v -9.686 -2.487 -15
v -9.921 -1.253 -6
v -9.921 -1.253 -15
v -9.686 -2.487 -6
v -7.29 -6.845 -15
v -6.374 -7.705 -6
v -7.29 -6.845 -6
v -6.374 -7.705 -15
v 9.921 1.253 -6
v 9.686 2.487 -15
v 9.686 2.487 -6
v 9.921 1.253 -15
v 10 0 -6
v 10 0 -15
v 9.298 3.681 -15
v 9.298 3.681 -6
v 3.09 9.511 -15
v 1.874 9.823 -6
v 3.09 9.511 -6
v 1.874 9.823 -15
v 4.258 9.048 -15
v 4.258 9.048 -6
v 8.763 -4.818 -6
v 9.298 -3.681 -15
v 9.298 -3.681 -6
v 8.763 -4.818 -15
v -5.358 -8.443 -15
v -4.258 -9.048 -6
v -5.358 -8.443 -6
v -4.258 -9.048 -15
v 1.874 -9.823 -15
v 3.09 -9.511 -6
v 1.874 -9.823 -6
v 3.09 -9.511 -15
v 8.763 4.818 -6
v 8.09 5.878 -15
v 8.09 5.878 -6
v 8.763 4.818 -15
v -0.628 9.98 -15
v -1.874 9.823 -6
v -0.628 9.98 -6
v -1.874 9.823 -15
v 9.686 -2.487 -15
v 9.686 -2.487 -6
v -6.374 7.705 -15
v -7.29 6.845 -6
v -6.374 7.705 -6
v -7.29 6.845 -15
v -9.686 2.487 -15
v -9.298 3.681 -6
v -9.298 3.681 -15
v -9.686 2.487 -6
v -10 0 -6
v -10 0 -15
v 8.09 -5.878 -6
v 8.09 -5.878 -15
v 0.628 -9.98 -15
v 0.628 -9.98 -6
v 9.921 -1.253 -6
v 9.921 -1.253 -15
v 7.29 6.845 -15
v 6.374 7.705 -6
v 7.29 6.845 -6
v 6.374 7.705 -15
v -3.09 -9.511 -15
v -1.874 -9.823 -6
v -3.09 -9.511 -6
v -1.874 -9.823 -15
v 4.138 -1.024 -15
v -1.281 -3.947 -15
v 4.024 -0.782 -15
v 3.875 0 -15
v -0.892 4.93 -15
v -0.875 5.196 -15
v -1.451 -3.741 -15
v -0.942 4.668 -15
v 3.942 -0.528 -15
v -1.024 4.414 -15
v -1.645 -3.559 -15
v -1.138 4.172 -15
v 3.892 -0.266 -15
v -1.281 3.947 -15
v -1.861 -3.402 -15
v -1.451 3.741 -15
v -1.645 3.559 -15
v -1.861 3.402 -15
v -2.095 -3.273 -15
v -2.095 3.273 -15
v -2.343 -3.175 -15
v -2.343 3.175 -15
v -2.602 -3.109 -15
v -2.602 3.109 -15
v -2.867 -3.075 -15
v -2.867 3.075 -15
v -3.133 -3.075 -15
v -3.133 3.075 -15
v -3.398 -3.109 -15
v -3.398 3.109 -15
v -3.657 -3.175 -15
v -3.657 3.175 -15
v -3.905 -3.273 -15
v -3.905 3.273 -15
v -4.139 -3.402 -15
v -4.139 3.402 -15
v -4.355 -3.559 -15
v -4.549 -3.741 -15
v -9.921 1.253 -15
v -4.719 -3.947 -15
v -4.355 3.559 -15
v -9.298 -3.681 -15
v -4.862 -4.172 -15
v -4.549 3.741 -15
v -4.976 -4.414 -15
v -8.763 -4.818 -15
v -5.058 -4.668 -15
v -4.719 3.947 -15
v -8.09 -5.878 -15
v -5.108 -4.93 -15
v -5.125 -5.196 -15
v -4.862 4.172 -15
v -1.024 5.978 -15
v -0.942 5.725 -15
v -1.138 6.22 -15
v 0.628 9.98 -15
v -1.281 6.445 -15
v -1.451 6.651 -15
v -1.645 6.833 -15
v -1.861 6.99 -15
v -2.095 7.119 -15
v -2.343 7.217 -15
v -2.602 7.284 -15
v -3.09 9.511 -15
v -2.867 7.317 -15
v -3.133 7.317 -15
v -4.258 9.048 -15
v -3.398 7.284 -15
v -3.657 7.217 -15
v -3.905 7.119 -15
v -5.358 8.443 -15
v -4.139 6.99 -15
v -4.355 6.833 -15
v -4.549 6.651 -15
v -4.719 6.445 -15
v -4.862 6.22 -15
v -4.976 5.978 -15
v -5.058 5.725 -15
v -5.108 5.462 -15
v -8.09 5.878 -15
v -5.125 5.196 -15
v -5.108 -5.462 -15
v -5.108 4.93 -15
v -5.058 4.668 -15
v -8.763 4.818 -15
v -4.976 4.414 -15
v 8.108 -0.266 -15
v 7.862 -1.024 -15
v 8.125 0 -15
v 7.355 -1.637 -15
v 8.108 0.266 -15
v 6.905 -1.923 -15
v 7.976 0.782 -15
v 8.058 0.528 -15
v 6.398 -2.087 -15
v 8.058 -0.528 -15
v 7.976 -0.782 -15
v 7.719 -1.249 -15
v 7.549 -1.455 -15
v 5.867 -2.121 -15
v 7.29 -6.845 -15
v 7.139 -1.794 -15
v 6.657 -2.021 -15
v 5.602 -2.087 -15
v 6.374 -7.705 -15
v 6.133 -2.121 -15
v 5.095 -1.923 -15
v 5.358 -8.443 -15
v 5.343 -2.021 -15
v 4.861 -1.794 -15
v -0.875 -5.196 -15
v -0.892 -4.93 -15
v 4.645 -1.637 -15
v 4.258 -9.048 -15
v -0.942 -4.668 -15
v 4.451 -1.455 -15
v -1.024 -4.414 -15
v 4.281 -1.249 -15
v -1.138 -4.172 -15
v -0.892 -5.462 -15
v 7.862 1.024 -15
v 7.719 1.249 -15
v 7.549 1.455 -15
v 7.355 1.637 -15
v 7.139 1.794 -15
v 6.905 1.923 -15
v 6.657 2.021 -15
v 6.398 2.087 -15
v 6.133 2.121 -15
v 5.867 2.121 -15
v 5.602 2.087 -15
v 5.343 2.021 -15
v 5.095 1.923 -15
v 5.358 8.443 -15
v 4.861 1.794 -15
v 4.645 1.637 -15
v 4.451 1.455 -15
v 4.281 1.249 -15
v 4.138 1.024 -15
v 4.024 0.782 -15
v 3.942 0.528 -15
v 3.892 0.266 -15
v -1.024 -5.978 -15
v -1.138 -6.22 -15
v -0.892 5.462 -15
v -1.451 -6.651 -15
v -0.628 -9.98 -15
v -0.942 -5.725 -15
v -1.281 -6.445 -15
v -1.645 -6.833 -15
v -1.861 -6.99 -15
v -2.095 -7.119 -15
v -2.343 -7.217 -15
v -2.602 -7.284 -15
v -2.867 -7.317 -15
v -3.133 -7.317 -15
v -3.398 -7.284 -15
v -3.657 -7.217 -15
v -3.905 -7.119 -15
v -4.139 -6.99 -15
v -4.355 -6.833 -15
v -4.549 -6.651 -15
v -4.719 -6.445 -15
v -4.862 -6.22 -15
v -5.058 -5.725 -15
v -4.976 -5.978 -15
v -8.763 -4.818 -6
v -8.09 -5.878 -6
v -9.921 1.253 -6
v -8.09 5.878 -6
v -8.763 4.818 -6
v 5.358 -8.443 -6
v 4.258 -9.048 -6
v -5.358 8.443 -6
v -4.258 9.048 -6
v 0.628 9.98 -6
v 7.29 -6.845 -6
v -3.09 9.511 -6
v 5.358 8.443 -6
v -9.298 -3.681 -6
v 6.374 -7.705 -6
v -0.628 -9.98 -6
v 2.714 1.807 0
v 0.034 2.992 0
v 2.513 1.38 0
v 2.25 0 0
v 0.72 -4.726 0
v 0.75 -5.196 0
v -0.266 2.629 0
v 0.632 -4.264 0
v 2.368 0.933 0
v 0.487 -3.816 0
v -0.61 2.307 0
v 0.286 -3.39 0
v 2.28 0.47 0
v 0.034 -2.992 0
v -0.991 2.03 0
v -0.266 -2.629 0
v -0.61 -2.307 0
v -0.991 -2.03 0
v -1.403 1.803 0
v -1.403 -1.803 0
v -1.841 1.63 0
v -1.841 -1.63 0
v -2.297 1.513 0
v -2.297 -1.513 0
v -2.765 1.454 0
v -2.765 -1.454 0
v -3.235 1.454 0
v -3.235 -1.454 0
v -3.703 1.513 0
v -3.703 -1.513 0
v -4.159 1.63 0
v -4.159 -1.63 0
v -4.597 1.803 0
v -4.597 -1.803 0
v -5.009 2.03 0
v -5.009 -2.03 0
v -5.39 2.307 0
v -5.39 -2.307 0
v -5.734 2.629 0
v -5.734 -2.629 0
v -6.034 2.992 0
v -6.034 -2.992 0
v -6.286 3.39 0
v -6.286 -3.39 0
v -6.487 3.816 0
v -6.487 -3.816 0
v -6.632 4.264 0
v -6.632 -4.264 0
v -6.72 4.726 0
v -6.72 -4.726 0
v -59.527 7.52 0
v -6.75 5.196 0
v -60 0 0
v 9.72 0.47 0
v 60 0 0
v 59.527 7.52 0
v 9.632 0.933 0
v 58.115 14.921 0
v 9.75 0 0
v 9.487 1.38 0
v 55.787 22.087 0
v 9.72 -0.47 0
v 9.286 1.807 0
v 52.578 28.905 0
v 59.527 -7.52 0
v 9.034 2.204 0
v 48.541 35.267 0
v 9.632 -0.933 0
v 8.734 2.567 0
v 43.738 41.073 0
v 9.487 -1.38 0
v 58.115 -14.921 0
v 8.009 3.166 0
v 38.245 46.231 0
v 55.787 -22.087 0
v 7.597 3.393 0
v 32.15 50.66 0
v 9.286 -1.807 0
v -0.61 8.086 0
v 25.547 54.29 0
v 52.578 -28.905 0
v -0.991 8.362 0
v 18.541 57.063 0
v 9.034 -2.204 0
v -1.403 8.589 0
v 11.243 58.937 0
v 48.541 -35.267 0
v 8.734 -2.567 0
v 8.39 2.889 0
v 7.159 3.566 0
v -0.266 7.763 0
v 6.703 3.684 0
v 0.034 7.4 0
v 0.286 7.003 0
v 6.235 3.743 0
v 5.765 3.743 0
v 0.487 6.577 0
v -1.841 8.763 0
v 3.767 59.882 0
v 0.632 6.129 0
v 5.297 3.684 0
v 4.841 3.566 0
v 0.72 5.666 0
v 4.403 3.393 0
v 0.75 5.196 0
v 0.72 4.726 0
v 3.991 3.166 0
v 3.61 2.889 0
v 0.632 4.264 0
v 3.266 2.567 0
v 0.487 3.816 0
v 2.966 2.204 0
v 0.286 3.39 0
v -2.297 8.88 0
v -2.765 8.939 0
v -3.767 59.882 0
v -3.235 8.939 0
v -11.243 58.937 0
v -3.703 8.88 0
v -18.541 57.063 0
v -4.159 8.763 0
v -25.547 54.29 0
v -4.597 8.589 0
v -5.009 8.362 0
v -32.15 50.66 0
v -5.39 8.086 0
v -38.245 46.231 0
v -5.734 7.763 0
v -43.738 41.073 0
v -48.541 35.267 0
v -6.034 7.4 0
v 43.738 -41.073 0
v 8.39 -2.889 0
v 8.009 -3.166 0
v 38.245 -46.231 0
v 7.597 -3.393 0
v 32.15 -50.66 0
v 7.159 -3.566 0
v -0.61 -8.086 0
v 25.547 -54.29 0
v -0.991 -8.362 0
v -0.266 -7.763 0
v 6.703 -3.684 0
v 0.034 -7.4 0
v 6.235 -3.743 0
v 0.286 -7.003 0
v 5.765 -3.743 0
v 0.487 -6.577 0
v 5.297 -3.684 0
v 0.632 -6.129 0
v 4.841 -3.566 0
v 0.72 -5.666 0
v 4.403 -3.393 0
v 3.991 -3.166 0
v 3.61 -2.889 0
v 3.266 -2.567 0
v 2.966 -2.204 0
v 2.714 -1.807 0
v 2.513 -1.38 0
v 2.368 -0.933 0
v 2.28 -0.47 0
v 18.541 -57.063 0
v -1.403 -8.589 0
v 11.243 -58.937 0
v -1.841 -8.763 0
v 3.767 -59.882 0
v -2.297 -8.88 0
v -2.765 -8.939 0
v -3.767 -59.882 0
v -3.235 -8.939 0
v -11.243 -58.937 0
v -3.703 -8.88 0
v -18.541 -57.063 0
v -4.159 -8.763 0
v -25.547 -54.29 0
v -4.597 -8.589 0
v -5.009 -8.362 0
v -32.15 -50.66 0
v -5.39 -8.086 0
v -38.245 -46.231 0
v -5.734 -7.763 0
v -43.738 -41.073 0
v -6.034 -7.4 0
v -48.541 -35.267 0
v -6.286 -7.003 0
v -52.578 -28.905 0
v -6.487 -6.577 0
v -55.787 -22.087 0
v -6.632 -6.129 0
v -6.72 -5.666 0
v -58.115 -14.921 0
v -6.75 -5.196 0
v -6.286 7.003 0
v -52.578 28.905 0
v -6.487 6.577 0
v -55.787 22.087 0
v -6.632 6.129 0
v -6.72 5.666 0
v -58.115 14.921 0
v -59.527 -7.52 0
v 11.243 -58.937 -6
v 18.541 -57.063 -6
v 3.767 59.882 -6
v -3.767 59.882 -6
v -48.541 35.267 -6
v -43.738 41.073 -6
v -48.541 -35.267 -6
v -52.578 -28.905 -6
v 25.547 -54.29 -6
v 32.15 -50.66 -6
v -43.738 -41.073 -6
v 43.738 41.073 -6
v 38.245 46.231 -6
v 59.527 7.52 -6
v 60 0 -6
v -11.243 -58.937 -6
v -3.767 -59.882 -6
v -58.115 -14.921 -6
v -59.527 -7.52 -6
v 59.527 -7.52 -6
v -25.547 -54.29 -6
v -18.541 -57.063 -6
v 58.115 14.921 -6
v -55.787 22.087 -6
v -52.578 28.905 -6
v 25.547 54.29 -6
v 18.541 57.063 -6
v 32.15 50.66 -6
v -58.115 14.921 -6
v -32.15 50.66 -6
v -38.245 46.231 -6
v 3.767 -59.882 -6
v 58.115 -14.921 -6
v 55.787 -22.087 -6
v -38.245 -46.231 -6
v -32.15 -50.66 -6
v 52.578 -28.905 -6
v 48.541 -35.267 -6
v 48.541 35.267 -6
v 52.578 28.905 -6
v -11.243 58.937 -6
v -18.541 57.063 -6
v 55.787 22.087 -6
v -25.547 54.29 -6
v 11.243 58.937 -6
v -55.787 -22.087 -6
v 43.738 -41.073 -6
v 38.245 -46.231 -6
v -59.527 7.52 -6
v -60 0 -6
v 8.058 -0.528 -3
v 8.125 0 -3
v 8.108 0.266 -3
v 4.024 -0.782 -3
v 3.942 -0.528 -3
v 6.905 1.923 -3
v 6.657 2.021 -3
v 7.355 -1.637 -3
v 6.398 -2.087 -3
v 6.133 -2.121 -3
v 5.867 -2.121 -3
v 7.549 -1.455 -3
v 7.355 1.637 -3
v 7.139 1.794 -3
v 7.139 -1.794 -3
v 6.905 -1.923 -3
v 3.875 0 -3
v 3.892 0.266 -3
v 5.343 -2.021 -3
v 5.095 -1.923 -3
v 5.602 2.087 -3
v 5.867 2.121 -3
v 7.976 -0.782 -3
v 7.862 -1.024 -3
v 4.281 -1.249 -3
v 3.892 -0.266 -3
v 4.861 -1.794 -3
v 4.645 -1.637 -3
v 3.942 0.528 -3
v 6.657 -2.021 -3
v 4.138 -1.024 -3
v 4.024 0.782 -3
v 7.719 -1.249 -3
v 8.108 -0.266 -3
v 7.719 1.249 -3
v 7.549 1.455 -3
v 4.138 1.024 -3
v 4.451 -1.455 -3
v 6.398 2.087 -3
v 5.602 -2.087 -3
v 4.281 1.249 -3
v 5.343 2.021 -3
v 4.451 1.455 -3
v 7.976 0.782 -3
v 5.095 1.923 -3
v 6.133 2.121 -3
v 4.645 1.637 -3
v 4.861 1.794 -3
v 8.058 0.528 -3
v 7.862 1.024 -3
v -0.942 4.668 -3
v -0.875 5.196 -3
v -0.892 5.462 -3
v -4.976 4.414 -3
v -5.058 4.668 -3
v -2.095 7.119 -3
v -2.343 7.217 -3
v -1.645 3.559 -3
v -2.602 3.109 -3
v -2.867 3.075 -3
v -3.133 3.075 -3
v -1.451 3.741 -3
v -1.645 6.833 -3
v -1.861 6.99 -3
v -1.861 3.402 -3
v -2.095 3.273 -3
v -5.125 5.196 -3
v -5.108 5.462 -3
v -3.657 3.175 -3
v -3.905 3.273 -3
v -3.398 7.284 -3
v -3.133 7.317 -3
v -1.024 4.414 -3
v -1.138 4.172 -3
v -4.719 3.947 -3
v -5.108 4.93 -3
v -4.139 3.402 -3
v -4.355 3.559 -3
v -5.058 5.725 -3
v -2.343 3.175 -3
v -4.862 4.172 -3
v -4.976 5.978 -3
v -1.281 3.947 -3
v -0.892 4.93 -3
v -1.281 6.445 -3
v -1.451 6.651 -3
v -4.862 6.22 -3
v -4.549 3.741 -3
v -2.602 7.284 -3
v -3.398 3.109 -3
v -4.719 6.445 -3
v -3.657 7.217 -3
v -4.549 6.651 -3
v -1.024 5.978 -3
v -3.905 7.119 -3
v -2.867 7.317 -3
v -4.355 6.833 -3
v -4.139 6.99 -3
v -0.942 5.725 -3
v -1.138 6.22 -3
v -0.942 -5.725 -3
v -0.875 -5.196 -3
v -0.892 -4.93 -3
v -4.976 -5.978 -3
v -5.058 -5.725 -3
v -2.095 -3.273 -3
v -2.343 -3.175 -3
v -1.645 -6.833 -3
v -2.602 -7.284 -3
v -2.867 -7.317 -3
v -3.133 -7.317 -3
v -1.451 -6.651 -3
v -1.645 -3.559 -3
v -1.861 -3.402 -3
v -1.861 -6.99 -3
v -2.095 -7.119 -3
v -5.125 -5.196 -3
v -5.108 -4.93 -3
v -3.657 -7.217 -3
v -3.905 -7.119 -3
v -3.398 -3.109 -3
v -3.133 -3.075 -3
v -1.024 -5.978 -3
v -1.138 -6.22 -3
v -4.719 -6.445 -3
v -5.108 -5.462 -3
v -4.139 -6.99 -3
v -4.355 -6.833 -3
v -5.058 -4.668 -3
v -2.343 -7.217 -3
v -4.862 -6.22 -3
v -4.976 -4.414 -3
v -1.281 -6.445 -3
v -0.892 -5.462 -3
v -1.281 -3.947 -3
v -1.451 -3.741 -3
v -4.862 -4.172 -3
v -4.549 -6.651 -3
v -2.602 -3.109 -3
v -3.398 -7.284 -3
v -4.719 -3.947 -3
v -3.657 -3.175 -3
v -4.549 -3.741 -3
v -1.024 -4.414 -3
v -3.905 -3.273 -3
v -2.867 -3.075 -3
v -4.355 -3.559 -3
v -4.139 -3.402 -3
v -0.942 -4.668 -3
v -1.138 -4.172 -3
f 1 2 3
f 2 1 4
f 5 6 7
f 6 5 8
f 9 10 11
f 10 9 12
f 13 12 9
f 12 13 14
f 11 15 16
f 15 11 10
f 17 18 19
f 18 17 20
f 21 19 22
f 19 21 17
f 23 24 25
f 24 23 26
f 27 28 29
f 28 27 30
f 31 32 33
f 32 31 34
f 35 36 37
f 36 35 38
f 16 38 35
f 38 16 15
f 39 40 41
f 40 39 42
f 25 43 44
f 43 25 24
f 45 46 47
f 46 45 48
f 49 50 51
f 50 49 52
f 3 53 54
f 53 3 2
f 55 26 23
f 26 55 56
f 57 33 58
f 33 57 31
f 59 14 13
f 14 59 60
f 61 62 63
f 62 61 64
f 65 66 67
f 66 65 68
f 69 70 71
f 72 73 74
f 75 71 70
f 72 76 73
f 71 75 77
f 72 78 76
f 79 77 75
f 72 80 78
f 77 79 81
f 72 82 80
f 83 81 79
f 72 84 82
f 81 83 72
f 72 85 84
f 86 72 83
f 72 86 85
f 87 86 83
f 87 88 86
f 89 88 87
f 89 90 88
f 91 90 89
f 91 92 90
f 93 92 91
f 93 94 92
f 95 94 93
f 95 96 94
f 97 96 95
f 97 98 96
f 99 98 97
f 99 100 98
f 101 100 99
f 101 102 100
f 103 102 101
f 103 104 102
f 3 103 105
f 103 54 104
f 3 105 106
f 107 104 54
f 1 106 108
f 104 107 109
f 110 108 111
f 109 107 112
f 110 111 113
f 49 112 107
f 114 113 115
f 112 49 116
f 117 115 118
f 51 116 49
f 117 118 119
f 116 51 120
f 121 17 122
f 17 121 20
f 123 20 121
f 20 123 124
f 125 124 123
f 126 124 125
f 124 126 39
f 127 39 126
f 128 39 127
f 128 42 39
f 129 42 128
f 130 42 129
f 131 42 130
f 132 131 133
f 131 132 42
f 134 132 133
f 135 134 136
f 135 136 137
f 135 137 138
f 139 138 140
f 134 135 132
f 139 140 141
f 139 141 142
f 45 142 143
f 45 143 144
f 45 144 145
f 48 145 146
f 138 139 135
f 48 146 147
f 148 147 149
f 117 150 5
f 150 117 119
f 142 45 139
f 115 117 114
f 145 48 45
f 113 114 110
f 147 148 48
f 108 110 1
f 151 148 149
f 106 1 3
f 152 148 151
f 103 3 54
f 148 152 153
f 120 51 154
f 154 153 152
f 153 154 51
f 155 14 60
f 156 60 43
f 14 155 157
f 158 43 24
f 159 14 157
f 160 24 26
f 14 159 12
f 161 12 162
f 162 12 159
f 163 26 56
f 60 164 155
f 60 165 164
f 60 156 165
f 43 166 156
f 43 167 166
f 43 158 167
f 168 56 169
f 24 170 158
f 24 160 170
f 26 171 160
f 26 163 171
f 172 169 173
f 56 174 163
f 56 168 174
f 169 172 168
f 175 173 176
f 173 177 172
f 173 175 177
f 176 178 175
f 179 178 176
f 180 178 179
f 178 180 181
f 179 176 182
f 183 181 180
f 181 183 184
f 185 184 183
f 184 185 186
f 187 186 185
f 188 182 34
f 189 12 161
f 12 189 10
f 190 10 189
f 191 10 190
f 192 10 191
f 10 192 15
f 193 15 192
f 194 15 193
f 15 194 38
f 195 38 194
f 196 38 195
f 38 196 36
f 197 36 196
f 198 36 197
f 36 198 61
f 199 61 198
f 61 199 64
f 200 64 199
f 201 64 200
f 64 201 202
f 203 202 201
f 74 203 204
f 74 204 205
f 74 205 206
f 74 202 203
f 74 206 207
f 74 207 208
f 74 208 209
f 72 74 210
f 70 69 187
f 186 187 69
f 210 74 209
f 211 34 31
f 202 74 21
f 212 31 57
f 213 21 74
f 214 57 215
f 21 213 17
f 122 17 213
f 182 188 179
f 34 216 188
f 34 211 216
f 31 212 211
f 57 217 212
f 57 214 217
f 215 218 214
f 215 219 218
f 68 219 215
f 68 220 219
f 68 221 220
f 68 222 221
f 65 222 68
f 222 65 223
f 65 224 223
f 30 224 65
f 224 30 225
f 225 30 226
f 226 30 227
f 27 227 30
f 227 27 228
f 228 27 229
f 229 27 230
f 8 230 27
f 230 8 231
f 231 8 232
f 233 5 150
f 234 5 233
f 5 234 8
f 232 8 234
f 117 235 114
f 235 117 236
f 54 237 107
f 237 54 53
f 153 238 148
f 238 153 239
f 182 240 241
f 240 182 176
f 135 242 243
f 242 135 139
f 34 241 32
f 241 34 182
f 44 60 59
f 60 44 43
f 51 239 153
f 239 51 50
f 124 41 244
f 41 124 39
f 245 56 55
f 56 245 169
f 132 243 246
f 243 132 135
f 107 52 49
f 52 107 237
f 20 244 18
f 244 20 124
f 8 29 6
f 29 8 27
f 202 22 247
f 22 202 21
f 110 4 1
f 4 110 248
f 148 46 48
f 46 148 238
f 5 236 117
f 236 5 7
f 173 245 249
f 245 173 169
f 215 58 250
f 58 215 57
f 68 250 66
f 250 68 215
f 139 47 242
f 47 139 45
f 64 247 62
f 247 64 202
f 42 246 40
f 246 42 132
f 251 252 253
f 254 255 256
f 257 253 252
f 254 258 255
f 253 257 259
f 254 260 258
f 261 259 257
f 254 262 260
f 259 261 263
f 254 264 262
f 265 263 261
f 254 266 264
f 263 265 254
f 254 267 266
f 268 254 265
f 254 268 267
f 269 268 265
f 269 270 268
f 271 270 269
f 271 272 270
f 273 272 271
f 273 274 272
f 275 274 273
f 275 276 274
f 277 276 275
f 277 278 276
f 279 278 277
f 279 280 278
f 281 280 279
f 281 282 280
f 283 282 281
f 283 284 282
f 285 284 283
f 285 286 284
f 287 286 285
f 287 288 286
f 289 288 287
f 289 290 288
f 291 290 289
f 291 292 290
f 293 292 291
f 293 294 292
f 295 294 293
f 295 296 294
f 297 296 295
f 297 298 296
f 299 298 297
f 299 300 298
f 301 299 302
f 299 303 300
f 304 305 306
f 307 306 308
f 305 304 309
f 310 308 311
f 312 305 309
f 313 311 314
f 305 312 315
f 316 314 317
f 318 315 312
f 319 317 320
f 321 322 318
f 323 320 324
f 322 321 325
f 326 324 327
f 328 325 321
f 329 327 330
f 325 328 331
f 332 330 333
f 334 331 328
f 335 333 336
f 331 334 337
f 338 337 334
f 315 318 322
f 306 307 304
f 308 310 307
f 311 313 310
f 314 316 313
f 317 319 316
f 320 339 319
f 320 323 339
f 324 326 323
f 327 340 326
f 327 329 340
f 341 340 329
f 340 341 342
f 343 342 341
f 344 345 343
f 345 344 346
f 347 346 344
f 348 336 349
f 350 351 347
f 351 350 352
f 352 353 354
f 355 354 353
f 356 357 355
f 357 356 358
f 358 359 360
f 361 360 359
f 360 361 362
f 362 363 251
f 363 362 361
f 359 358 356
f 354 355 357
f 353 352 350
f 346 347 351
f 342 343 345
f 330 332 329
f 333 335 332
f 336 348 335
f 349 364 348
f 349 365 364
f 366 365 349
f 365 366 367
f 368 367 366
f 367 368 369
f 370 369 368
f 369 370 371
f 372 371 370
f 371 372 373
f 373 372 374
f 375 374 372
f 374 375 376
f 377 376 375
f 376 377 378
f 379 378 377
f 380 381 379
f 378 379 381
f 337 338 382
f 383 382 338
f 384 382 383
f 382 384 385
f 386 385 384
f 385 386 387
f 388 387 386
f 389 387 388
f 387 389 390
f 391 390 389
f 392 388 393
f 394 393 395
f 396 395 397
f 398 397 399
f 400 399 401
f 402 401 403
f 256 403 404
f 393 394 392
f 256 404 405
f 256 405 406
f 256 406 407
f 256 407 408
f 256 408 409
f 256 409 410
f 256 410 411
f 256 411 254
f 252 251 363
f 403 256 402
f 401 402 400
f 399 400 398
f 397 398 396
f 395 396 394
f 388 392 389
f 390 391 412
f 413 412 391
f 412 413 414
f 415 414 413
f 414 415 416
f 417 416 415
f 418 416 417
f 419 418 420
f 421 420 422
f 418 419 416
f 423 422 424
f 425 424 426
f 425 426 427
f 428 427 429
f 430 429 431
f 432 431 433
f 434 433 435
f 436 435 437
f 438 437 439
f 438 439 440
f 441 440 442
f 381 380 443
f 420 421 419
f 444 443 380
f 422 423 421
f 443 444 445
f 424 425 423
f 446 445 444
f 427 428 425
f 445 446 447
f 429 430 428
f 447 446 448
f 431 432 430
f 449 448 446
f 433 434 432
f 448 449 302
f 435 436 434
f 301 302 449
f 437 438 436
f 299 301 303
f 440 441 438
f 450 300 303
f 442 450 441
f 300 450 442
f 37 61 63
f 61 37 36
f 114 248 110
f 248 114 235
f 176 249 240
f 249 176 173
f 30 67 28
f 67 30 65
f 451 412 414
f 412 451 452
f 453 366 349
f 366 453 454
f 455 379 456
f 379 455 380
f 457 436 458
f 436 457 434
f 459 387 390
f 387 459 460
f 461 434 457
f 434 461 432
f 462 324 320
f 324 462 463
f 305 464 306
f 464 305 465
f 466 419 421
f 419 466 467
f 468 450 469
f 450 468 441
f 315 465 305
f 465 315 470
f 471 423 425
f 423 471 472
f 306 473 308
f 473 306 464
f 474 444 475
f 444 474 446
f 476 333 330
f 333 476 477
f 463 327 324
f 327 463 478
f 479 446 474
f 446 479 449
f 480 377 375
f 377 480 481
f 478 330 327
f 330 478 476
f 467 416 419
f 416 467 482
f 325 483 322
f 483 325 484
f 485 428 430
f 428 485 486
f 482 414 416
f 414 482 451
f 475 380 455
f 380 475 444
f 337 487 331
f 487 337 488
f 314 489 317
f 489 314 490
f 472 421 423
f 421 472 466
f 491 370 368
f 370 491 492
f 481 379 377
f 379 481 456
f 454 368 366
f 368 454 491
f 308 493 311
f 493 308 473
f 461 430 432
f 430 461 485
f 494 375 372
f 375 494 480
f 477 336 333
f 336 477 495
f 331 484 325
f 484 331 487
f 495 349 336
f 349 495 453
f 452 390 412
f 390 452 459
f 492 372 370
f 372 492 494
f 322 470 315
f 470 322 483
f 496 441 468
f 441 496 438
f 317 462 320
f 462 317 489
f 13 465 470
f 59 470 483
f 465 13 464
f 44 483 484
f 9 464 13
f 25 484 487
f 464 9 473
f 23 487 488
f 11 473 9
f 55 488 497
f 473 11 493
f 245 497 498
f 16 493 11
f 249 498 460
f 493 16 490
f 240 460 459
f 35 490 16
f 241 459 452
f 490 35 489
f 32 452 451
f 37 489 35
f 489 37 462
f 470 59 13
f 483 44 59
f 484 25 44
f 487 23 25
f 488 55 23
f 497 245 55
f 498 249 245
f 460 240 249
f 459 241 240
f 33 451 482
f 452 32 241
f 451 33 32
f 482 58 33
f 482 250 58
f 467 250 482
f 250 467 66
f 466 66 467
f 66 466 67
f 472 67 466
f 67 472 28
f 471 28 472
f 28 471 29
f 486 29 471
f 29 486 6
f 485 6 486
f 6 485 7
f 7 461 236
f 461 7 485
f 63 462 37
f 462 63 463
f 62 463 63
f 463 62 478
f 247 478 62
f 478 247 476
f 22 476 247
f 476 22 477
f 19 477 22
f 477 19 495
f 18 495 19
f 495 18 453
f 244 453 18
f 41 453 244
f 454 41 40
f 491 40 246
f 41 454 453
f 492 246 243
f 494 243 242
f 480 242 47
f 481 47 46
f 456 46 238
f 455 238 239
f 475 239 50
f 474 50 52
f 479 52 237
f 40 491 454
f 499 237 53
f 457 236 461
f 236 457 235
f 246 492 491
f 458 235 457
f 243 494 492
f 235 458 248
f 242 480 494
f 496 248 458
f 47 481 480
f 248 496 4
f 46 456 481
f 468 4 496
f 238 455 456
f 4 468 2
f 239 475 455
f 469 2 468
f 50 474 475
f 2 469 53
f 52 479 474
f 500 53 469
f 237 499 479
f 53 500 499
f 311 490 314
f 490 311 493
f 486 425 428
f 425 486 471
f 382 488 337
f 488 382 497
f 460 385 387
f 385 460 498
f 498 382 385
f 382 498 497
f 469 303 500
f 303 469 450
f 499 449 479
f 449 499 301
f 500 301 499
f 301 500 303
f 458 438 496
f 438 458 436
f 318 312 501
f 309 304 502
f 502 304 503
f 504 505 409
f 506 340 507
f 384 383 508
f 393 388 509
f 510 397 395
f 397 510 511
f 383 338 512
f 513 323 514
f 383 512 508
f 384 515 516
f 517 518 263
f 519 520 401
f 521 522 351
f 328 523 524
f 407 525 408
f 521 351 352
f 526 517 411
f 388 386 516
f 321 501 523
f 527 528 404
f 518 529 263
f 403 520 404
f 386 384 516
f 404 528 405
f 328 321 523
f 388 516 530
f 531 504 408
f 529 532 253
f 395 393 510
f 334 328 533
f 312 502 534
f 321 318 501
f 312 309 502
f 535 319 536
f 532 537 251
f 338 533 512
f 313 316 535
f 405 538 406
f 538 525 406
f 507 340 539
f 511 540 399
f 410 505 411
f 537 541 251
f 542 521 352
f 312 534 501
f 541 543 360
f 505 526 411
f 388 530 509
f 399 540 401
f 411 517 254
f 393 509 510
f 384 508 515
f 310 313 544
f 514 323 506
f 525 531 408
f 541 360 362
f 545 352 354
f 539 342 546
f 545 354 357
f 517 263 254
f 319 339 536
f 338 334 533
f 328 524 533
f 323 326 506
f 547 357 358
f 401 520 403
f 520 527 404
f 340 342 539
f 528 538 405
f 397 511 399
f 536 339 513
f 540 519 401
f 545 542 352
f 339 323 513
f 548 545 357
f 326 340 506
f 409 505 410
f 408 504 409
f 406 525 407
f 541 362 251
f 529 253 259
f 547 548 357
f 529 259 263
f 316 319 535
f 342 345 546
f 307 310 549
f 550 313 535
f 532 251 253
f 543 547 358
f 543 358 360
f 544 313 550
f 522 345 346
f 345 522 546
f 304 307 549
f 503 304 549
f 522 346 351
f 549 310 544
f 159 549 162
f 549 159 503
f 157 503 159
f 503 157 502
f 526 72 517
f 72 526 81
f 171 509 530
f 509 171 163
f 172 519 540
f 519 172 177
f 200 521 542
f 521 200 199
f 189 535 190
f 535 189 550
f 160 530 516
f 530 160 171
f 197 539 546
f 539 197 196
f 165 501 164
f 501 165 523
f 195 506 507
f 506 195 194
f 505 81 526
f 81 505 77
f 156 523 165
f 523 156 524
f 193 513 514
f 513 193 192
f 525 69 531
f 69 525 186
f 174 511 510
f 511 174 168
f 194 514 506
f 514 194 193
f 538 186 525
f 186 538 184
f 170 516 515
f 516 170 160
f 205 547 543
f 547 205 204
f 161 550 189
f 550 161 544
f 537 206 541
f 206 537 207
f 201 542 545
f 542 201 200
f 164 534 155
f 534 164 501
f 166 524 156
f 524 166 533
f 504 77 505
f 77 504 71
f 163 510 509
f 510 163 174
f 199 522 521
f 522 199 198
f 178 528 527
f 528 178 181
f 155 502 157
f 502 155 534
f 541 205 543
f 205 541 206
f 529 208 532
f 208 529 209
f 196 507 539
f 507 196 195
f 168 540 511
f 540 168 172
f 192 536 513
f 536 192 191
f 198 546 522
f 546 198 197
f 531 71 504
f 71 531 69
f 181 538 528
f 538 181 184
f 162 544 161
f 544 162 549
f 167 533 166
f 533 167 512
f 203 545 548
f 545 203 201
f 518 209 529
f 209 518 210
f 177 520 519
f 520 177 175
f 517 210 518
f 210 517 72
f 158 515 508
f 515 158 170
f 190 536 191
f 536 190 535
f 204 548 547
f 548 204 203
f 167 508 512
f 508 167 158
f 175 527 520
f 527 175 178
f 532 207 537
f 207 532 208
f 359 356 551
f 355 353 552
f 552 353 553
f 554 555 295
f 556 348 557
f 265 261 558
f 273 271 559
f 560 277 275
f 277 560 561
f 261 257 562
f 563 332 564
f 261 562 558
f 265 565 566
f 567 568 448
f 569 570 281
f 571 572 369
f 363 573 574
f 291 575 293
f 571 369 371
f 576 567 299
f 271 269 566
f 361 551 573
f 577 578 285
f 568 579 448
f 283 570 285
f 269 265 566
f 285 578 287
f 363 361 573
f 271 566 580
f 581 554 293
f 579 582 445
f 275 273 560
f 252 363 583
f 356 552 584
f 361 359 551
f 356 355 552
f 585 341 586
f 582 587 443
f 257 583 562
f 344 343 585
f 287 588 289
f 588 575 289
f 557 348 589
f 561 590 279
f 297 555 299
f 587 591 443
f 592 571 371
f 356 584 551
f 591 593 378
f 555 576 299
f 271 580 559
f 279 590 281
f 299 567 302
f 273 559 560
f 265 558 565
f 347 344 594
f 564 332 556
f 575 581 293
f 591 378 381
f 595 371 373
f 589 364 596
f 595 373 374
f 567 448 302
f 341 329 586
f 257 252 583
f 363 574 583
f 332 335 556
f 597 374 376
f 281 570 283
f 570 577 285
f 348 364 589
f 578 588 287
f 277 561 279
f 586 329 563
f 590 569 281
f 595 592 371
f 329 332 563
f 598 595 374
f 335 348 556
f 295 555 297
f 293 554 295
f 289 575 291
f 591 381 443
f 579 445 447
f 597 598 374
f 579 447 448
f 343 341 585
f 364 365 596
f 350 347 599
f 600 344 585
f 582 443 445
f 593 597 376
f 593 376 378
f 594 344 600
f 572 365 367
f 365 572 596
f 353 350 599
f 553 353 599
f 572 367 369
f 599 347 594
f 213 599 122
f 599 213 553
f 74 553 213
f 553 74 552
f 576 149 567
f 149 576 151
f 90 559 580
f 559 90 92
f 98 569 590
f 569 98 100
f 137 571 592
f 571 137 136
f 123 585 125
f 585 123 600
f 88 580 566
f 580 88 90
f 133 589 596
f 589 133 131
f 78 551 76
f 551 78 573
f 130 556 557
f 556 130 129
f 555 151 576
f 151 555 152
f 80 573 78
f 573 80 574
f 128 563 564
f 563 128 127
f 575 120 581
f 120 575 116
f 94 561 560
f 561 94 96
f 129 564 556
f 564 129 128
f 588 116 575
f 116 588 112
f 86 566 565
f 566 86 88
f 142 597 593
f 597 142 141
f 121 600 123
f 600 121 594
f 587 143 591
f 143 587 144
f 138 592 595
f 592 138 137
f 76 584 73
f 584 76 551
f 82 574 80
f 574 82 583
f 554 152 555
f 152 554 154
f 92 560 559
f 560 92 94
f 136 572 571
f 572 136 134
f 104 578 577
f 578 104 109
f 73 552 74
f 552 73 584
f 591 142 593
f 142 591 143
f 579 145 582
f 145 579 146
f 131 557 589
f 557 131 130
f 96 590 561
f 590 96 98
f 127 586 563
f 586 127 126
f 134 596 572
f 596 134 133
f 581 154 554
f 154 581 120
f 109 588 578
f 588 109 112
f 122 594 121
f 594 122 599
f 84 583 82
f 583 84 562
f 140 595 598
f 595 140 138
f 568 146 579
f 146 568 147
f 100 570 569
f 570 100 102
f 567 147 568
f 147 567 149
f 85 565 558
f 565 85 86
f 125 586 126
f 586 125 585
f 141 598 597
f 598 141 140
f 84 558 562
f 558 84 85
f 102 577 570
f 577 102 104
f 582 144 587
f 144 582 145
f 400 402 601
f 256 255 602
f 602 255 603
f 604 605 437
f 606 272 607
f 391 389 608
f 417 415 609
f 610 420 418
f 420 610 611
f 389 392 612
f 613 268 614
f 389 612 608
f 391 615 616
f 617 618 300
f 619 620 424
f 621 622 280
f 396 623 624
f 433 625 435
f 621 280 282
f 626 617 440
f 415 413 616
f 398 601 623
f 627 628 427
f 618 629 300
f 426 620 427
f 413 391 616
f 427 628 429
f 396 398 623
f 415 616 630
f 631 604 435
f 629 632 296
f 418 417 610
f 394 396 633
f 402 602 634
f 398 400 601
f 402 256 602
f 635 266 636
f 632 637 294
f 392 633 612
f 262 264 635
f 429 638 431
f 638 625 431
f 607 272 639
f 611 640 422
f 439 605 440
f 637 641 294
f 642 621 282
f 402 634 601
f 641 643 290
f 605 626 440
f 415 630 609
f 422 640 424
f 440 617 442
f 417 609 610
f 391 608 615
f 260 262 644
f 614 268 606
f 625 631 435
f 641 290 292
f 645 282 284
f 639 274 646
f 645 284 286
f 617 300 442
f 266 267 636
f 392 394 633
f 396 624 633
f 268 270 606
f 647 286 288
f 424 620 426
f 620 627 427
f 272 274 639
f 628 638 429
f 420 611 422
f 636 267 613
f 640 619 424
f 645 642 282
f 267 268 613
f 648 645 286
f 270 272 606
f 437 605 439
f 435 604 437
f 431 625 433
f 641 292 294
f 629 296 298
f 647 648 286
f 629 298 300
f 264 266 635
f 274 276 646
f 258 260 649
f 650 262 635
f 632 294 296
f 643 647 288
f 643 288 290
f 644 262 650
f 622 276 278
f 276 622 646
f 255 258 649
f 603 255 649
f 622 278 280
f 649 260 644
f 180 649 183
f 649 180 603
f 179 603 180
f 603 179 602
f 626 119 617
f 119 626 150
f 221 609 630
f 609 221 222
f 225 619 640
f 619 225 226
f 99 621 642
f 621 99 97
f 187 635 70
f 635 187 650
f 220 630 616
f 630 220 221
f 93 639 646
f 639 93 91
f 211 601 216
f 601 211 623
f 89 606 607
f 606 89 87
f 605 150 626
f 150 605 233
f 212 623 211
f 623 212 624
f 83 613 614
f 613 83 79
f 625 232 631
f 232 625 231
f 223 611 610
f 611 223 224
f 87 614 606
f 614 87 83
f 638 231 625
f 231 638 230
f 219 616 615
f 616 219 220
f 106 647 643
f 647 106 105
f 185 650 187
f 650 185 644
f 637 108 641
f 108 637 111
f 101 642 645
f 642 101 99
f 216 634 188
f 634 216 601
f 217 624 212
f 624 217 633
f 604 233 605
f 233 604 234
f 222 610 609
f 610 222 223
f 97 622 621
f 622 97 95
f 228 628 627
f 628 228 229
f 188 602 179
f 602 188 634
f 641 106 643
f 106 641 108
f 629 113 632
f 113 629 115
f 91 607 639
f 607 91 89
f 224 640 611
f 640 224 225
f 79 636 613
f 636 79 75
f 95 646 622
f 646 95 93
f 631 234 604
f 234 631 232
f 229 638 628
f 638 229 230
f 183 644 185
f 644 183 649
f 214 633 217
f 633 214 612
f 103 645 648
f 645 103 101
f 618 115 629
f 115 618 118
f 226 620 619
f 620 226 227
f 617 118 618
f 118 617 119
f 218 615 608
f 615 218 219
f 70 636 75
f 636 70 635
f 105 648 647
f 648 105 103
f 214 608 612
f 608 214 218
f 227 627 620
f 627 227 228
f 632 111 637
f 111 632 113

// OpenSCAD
$fn = 50;


difference() {
	union() {
		translate(v = [0, 0, -15.0000000000]) {
			cylinder(h = 15, r = 10.0000000000);
		}
		translate(v = [0, 0, -6.0000000000]) {
			cylinder(h = 6, r = 60.0000000000);
		}
	}
	union() {
		translate(v = [6.0000000000, 0.0000000000, 0]) {
			rotate(a = [0, 0, 0]) {
				difference() {
					union() {
						#translate(v = [0, 0, -15.0000000000]) {
							cylinder(h = 15, r = 2.0000000000);
						}
						#translate(v = [0, 0, -3]) {
							cylinder(h = 3, r = 10.0000000000, r1 = 2.1250000000, r2 = 3.7500000000);
						}
						#translate(v = [0, 0, -15.0000000000]) {
							cylinder(h = 15, r = 2.1250000000);
						}
						#translate(v = [0, 0, -15.0000000000]) {
							cylinder(h = 15, r = 2.0000000000);
						}
					}
					union();
				}
			}
		}
		translate(v = [-3.0000000000, 5.1961524227, 0]) {
			rotate(a = [0, 0, 0]) {
				difference() {
					union() {
						#translate(v = [0, 0, -15.0000000000]) {
							cylinder(h = 15, r = 2.0000000000);
						}
						#translate(v = [0, 0, -3]) {
							cylinder(h = 3, r = 10.0000000000, r1 = 2.1250000000, r2 = 3.7500000000);
						}
						#translate(v = [0, 0, -15.0000000000]) {
							cylinder(h = 15, r = 2.1250000000);
						}
						#translate(v = [0, 0, -15.0000000000]) {
							cylinder(h = 15, r = 2.0000000000);
						}
					}
					union();
				}
			}
		}
		translate(v = [-3.0000000000, -5.1961524227, 0]) {
			rotate(a = [0, 0, 0]) {
				difference() {
					union() {
						#translate(v = [0, 0, -15.0000000000]) {
							cylinder(h = 15, r = 2.0000000000);
						}
						#translate(v = [0, 0, -3]) {
							cylinder(h = 3, r = 10.0000000000, r1 = 2.1250000000, r2 = 3.7500000000);
						}
						#translate(v = [0, 0, -15.0000000000]) {
							cylinder(h = 15, r = 2.1250000000);
						}
						#translate(v = [0, 0, -15.0000000000]) {
							cylinder(h = 15, r = 2.0000000000);
						}
					}
					union();
				}
			}
		}
	}
}
